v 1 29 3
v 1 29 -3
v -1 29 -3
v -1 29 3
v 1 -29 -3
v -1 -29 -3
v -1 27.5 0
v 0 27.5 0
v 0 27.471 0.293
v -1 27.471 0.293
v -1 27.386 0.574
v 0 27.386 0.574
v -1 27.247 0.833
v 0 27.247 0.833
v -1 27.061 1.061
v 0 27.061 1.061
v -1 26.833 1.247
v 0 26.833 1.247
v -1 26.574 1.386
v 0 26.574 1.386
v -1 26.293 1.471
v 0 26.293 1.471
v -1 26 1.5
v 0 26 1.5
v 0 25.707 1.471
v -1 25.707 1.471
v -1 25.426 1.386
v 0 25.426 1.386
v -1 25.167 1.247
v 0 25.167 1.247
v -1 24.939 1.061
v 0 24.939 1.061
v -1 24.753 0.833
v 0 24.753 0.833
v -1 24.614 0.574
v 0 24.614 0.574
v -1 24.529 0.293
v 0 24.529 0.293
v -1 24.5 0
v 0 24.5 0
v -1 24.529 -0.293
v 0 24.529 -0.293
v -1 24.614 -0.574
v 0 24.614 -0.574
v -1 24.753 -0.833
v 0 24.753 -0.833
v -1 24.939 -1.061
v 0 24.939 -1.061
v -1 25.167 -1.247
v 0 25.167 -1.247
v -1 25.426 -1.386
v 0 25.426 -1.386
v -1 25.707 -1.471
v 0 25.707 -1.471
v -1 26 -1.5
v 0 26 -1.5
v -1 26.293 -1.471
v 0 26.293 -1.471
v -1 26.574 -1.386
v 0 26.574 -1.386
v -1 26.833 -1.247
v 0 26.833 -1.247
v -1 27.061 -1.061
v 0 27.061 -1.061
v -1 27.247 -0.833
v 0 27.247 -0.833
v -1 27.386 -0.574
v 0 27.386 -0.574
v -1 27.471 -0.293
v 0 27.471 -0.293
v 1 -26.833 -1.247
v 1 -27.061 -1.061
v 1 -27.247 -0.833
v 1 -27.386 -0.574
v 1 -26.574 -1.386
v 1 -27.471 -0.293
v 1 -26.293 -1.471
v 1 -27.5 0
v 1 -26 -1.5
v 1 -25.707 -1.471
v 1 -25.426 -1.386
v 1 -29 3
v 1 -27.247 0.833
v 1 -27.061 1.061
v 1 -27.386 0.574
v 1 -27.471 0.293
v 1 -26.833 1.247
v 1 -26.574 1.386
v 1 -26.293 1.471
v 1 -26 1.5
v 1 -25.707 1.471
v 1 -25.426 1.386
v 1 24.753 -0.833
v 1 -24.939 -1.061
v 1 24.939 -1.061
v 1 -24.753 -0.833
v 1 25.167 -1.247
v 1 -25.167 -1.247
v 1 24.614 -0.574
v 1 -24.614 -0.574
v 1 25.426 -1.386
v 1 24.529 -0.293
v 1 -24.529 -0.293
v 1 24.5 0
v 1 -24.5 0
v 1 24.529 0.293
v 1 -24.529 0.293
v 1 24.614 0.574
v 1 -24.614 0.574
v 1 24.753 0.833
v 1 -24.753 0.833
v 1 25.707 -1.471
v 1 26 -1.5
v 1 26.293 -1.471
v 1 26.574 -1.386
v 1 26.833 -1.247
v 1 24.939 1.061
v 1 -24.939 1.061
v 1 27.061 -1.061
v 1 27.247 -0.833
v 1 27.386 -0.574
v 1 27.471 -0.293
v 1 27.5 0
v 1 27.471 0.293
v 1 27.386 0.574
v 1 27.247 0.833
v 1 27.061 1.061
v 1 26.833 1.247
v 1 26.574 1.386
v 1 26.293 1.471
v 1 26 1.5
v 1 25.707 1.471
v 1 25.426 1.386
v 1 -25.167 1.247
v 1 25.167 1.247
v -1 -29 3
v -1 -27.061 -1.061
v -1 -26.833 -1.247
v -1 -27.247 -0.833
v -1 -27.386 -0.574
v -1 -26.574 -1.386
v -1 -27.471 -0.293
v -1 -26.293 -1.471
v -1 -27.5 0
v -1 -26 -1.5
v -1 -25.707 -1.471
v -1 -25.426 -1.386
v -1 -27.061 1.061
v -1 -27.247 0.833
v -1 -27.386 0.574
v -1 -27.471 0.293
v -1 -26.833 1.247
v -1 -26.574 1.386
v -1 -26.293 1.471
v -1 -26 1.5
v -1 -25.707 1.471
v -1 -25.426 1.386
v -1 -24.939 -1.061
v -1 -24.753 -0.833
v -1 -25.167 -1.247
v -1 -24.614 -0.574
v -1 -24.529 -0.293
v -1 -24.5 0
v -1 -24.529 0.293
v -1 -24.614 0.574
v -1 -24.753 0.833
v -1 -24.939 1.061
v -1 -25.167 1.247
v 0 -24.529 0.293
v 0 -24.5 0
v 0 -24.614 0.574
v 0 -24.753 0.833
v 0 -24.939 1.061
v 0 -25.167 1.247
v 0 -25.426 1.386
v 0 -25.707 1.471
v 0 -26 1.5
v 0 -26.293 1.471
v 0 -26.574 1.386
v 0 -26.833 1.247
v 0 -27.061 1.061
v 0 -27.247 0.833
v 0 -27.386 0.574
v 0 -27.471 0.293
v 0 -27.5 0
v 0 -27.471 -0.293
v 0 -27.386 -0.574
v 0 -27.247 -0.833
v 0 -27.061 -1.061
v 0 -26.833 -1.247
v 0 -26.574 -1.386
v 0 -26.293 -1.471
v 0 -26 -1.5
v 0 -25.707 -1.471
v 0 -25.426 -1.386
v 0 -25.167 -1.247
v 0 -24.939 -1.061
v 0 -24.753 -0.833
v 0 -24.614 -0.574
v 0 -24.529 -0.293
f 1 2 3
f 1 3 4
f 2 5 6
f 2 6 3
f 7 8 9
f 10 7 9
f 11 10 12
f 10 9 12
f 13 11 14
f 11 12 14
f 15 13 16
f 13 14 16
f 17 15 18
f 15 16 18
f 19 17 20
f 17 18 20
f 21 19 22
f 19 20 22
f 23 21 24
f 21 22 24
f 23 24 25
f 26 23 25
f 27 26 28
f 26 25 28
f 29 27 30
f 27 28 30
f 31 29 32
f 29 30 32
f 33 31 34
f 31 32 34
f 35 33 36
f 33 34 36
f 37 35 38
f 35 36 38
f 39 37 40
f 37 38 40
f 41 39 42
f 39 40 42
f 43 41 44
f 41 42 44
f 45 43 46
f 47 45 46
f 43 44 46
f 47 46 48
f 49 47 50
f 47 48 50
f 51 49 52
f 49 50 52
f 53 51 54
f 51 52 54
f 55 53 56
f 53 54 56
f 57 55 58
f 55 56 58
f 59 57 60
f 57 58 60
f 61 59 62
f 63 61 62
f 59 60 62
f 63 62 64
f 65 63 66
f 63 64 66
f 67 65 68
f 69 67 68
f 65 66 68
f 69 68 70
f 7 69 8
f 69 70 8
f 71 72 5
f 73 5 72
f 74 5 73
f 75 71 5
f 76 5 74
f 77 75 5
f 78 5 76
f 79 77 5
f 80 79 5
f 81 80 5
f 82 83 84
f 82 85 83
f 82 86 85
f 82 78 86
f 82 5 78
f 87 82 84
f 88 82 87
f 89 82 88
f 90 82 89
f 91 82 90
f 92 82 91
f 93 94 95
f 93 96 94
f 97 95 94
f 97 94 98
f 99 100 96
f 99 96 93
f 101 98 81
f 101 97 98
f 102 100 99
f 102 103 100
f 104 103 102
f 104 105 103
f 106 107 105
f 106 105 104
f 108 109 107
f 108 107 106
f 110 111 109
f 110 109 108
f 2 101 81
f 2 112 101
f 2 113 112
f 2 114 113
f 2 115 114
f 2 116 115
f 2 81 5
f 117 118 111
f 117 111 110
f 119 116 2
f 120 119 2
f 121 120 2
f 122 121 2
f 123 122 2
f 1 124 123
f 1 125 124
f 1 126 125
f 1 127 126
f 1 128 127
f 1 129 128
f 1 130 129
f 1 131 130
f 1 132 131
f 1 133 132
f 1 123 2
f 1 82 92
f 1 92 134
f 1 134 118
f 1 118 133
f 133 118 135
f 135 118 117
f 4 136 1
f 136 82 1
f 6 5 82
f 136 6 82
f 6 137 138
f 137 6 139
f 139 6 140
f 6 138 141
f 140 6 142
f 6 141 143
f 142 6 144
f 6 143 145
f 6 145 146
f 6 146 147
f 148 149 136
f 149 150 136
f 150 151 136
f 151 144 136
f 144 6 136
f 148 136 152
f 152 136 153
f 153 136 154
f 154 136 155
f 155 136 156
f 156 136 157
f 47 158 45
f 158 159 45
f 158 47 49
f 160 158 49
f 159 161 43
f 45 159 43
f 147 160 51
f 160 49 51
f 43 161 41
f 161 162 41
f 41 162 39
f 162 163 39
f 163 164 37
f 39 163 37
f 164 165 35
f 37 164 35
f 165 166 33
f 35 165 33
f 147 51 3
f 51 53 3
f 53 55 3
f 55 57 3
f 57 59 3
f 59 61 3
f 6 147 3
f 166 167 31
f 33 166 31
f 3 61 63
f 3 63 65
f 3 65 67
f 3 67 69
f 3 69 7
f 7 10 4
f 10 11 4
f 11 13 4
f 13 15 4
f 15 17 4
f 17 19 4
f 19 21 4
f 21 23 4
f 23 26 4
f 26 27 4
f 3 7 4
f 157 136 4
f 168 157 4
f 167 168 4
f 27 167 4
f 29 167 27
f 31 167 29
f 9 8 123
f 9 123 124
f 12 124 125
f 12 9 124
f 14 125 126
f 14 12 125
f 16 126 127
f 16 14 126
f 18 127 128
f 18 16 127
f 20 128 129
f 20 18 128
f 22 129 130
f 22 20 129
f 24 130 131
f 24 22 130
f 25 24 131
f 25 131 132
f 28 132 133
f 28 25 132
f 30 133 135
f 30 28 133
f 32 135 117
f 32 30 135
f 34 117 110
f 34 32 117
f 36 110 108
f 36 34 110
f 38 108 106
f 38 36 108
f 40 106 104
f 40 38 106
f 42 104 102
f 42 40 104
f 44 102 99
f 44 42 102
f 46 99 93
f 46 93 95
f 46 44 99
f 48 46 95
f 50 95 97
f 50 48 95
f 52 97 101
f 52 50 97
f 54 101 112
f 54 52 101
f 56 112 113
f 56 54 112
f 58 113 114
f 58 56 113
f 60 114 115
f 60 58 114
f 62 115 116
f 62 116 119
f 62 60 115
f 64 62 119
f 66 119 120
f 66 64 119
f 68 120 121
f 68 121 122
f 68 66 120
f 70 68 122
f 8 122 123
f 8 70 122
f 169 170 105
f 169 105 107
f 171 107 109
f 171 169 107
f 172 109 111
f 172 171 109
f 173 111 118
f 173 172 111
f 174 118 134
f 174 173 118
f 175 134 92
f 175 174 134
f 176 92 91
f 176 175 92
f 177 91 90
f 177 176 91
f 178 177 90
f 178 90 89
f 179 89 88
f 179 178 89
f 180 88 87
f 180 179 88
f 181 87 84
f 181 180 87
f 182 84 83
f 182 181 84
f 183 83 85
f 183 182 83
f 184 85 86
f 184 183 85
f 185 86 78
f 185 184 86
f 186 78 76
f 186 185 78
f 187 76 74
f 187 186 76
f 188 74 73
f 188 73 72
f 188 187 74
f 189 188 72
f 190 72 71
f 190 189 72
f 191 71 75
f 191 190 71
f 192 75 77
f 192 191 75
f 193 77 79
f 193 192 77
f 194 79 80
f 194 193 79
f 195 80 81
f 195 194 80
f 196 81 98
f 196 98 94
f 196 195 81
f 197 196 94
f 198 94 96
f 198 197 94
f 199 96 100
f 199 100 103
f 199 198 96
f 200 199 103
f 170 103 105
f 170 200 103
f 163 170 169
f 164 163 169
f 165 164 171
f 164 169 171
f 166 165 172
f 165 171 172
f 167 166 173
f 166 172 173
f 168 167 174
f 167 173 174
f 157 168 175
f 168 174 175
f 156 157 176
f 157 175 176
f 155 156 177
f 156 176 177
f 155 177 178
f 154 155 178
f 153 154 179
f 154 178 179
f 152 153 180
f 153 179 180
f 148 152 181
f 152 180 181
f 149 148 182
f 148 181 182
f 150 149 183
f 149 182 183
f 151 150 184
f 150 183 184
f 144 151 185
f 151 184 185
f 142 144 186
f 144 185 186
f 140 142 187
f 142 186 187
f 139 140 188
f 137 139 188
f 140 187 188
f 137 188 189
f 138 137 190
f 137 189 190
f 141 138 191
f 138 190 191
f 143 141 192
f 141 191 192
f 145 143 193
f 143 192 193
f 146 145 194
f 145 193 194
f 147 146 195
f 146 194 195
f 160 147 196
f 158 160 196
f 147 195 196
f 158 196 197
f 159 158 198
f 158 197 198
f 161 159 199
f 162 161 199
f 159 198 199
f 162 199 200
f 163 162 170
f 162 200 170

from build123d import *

# Parameters (mm, degrees)
F0_W          = 58
F0_H          = 6
F0_R          = 1.5
F1_DEPTH      = 1
F1_DEPTH_BACK = 1


with BuildPart() as f1:
    # F0 (on Right) → F1 (new body, two sides)
    with BuildSketch(Plane.YZ) as f1_sk:
        Rectangle(F0_W, F0_H)
        with Locations((-26, 0)):
            Circle(F0_R, mode=Mode.SUBTRACT)
        with Locations((26, 0)):
            Circle(F0_R, mode=Mode.SUBTRACT)
    extrude(amount=F1_DEPTH)
    extrude(f1_sk.sketch, amount=-F1_DEPTH_BACK)


solid = f1.part
